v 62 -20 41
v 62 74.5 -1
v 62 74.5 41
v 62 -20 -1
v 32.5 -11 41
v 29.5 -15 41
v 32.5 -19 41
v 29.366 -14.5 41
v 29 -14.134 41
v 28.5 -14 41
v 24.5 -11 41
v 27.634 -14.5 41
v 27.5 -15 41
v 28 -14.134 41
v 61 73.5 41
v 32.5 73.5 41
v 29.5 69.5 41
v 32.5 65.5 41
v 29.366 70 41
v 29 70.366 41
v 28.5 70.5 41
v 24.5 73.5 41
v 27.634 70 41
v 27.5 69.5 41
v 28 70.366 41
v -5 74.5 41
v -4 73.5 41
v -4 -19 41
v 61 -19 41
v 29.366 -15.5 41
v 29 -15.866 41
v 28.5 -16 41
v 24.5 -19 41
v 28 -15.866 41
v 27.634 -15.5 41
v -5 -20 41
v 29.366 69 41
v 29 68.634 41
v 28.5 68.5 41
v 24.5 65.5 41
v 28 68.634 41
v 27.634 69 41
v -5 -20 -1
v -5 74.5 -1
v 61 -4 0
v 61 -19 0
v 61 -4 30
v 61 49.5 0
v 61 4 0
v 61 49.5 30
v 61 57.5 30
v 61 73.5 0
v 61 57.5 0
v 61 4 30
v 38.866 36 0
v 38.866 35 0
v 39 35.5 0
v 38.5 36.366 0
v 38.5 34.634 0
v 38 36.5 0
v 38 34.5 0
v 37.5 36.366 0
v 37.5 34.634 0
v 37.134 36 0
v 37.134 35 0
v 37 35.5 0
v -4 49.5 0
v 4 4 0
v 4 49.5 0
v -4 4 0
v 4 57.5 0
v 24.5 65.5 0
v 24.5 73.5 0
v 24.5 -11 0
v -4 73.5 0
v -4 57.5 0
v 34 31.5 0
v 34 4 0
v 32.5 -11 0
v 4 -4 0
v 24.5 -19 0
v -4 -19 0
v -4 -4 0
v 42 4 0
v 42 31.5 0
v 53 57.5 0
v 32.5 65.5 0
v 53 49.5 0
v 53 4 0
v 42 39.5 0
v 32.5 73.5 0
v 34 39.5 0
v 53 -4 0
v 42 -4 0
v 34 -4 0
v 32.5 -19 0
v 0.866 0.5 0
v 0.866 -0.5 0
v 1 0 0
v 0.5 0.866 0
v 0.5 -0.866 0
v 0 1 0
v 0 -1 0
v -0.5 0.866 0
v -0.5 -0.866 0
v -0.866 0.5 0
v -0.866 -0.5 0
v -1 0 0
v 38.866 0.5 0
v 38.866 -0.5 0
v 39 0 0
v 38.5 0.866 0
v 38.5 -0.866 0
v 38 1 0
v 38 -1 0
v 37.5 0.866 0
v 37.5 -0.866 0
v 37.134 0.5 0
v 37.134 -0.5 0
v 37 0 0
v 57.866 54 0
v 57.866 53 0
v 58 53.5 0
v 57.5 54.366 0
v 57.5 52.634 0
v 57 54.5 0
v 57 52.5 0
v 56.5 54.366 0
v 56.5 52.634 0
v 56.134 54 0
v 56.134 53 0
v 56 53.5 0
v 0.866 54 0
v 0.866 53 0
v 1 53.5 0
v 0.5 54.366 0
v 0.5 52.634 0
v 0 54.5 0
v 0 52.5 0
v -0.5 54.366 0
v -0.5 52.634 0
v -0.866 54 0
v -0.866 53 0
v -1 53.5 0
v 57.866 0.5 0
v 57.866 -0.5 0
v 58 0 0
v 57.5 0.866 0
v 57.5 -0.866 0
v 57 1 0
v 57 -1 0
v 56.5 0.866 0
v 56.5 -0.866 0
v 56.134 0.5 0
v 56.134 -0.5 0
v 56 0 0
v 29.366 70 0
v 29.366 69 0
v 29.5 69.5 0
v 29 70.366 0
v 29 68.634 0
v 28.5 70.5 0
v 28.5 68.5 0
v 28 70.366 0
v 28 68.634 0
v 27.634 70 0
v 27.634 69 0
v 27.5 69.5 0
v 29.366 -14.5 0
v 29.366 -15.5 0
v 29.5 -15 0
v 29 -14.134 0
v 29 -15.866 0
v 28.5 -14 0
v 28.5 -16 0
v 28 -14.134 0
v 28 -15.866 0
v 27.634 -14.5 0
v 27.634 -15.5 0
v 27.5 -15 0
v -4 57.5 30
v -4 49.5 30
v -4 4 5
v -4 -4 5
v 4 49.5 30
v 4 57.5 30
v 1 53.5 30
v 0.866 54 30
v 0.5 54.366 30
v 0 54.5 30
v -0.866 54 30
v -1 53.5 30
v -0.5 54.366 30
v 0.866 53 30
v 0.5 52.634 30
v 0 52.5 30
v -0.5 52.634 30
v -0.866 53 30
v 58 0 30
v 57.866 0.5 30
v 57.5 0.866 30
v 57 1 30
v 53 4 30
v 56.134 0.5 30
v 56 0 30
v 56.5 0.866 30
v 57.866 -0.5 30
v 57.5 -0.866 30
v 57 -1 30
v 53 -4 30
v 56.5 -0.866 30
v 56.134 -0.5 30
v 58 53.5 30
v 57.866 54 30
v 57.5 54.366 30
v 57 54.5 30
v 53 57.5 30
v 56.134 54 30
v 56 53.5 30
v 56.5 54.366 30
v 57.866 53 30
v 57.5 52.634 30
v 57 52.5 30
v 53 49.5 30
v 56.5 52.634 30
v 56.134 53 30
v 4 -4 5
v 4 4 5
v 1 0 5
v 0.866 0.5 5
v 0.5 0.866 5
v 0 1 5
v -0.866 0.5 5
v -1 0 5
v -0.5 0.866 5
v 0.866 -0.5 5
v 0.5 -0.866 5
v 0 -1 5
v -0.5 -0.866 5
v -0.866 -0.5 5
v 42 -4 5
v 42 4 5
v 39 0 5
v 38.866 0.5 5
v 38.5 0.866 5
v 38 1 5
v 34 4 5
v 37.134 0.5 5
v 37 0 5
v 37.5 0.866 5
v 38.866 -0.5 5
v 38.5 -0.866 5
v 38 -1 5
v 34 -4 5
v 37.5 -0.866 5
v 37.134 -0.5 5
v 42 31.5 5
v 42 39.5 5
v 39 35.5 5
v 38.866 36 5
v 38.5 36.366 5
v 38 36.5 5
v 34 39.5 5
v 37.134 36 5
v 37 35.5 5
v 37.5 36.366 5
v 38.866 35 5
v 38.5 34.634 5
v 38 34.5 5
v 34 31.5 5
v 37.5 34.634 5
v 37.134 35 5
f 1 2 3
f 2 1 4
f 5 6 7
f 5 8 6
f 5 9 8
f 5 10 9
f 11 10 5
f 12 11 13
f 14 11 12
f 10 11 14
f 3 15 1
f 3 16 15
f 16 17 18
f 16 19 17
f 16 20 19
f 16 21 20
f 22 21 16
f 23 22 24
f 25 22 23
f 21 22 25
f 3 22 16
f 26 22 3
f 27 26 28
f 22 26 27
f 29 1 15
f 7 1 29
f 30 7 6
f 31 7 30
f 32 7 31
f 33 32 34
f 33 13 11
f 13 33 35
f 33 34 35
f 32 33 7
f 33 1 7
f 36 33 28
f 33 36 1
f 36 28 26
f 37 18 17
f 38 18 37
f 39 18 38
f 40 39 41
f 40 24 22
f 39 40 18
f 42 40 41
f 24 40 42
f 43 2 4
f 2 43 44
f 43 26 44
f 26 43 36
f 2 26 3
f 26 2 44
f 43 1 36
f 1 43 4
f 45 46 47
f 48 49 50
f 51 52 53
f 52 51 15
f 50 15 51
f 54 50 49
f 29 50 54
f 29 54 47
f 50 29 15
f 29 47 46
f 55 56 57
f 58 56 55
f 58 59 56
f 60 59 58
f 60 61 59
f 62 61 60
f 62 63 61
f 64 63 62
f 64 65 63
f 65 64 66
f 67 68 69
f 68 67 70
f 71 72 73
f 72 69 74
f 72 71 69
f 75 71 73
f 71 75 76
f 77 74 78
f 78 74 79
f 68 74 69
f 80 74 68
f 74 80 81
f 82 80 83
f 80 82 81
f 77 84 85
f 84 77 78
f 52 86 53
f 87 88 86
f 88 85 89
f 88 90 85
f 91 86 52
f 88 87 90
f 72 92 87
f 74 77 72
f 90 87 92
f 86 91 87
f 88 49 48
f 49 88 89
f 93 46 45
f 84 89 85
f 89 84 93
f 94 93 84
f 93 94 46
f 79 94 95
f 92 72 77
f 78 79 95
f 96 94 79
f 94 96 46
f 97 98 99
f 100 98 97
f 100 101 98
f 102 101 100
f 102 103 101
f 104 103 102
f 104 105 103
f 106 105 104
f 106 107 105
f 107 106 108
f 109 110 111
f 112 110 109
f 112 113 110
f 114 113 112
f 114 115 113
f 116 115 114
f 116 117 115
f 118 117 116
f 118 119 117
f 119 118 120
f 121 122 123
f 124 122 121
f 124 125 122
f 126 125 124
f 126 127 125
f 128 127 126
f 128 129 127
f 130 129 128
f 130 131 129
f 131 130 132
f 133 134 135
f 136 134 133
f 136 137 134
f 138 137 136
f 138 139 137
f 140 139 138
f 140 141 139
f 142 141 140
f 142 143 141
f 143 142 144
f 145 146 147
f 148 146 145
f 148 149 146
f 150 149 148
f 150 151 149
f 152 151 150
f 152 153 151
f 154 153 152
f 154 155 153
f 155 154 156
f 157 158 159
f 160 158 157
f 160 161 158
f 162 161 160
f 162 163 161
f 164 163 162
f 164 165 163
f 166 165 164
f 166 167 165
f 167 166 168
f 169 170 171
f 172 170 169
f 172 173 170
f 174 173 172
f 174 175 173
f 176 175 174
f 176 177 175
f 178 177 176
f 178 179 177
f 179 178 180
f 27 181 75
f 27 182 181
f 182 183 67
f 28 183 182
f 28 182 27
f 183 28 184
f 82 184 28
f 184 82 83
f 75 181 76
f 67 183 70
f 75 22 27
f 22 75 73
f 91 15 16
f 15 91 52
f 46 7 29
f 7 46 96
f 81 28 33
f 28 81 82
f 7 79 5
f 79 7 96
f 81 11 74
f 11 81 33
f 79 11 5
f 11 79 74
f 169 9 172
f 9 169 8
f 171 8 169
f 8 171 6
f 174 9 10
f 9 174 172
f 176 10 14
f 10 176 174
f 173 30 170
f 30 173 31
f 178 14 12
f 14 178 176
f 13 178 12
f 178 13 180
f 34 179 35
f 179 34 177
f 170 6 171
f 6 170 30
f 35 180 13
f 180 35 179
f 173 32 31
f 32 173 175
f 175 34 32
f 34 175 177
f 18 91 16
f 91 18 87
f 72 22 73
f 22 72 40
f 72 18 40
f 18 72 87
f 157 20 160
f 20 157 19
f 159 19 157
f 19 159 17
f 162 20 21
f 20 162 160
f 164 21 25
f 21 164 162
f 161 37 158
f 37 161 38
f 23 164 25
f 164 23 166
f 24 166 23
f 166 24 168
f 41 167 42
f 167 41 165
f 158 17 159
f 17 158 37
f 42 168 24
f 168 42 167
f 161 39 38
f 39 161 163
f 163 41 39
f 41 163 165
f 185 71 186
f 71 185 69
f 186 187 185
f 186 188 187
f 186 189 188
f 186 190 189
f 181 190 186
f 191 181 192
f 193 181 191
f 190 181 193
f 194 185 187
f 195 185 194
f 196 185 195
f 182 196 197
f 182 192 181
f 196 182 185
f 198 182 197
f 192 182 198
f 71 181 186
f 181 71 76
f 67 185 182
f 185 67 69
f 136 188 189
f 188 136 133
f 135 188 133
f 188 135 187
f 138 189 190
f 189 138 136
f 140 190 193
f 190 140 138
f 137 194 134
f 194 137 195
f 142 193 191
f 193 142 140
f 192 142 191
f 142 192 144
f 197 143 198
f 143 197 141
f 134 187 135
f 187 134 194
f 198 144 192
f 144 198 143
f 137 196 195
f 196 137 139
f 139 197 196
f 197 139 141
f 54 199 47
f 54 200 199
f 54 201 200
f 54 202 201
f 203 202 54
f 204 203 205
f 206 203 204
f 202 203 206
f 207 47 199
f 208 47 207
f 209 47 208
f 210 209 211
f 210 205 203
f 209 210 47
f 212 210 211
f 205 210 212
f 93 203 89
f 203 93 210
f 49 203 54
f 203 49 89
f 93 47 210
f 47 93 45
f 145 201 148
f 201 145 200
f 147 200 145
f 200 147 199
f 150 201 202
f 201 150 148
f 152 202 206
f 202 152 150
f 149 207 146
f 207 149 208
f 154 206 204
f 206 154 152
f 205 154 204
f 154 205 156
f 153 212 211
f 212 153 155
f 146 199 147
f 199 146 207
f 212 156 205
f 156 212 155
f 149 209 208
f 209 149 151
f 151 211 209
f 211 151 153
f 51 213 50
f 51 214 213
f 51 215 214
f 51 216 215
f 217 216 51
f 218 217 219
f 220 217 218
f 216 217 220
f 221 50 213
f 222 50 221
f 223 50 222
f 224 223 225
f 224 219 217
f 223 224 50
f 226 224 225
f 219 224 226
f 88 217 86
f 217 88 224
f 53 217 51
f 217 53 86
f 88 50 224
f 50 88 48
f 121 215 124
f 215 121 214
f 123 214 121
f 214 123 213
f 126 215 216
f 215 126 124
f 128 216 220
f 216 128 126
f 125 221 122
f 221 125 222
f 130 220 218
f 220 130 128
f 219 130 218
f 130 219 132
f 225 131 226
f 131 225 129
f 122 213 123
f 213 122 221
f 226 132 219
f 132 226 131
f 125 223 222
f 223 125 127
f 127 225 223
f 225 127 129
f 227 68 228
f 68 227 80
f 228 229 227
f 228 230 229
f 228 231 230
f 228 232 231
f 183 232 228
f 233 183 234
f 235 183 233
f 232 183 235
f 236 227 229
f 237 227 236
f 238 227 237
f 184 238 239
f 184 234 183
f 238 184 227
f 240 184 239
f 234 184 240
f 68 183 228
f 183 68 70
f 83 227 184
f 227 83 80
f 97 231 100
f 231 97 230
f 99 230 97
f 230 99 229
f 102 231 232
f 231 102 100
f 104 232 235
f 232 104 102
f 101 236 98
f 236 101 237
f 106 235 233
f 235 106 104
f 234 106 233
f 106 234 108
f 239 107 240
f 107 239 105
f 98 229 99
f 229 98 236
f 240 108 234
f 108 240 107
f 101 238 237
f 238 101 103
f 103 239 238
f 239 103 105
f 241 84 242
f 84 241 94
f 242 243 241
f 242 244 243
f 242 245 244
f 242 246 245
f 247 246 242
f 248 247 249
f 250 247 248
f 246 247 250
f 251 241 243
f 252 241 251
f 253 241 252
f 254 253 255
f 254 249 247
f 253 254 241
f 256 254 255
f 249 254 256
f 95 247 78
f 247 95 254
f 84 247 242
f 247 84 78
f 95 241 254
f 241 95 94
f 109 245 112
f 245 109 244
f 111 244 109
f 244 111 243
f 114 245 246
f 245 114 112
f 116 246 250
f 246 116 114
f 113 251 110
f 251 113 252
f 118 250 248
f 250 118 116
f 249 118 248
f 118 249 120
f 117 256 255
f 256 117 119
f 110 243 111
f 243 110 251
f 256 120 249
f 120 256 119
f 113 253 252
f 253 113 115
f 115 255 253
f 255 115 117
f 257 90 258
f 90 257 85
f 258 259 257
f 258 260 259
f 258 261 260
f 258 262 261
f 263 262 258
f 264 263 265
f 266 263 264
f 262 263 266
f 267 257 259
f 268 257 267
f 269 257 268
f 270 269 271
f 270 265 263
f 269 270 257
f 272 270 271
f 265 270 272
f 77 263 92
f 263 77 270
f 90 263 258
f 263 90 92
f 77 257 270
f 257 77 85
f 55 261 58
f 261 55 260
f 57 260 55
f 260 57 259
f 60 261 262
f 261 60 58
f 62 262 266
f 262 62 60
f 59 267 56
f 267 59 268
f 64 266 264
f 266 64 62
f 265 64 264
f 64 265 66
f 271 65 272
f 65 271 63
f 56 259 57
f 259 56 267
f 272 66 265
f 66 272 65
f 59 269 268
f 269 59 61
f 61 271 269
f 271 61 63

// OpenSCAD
$fn=12;

//Box wall thickness
WALL_T=1;

//Standoff dimensions
STAND_R=8.0;
STAND_HOLE_R=1.0;

//ProMicro board dimensions
MICRO_H_DIM=[38, 35.5, 0];
MICRO_H_OFFSET=4;
MICRO_STAND_H=5;

//Trigger board dimensions
TRIG_H_DIM=[57, 53.5, 0];
TRIG_H_OFFSET=2.5;
TRIG_THICK=0;
TRIG_DIM=[TRIG_H_DIM[0], TRIG_H_DIM[1]+TRIG_H_OFFSET*2, TRIG_THICK];
TRIG_STAND_H=30;
TRIG_COMP_H=11;

//BOX Bottom Dimensions
BOX_X_SPACE=0;
BOX_Y_SPACE=30;
BOX_BOTTOM_INSIDE_D = [TRIG_DIM[0]+BOX_X_SPACE+STAND_R, TRIG_DIM[1]+BOX_Y_SPACE+STAND_R/2, TRIG_STAND_H+TRIG_COMP_H+TRIG_THICK];
BOX_BOTTOM_OUTSIDE_D = [BOX_BOTTOM_INSIDE_D[0]+WALL_T*2, BOX_BOTTOM_INSIDE_D[1]+WALL_T*2, BOX_BOTTOM_INSIDE_D[2]+WALL_T];
BOX_TOP_H=5+WALL_T;
BOX_TOP_CLR=0.5;

boxTop();
!boxBottomComplete();

module boxBottomComplete() {
	union() {
		boxBottom();
		trigStands();
		microStands();
	}
}

module boxTop() {
	translate([-STAND_R/2-WALL_T-BOX_TOP_CLR/2, -STAND_R/2-WALL_T-BOX_TOP_CLR/2, -BOX_TOP_H-WALL_T])
	difference() {
		translate([-BOX_X_SPACE/2-WALL_T, -BOX_Y_SPACE/2-WALL_T, -BOX_TOP_H-WALL_T])
			cube([BOX_BOTTOM_OUTSIDE_D[0]+WALL_T*2+BOX_TOP_CLR, BOX_BOTTOM_OUTSIDE_D[1]+WALL_T*2+BOX_TOP_CLR, BOX_TOP_H]);
		translate([-BOX_X_SPACE/2, -BOX_Y_SPACE/2, -BOX_TOP_H])
			cube([BOX_BOTTOM_OUTSIDE_D[0]+BOX_TOP_CLR, BOX_BOTTOM_OUTSIDE_D[1]+BOX_TOP_CLR, BOX_TOP_H]);
    }
}

module boxBottom() {
	translate([-STAND_R/2, -STAND_R/2, 0])
    union() {
		difference() {
			translate([-WALL_T-BOX_X_SPACE/2, -WALL_T-BOX_Y_SPACE/2, -WALL_T])
				cube([BOX_BOTTOM_OUTSIDE_D[0], BOX_BOTTOM_OUTSIDE_D[1], BOX_BOTTOM_OUTSIDE_D[2]]);
			translate([-BOX_X_SPACE/2, -BOX_Y_SPACE/2, 0])
				cube([BOX_BOTTOM_INSIDE_D[0], BOX_BOTTOM_INSIDE_D[1], BOX_BOTTOM_INSIDE_D[2]+WALL_T*2]);
	    }
	
		translate([BOX_BOTTOM_INSIDE_D[0]/2-STAND_R/2, -BOX_Y_SPACE/2, 0])
			boxStand();
	
		translate([BOX_BOTTOM_INSIDE_D[0]/2-STAND_R/2, BOX_BOTTOM_INSIDE_D[1]-BOX_Y_SPACE/2-STAND_R, 0])
			boxStand();
    }
}

module boxStand() {
	difference() {
		cube([STAND_R, STAND_R, BOX_BOTTOM_INSIDE_D[2]]);
		translate([STAND_R/2, STAND_R/2, -0.01])
			cylinder(r=STAND_HOLE_R, h=BOX_BOTTOM_INSIDE_D[2]+WALL_T+0.02);
	}
}

module microStands() {
	translate([-STAND_R/2, -STAND_R/2, 0])
    union() {
		microStand();
//		translate([0, MICRO_H_DIM[1], 0])
//			microStand();
		translate([MICRO_H_DIM[0], 0, 0])
			microStand(cylinder=false);
		translate([MICRO_H_DIM[0], MICRO_H_DIM[1], 0])
			microStand(cylinder=false);
    }
}

module microStand(cylinder=false) {
	difference() {
		if ( cylinder ) {
			translate([STAND_R/2, STAND_R/2, 0])
				cylinder(r=STAND_R, h=MICRO_STAND_H);
		}
		else
			cube([STAND_R, STAND_R, MICRO_STAND_H]);
		translate([STAND_R/2, STAND_R/2, -0.01])
			cylinder(r=STAND_HOLE_R, h=MICRO_STAND_H+0.02);
	}
}

module trigStands() {
	translate([-STAND_R/2, -STAND_R/2, 0])
    union() {
		translate([0, TRIG_H_DIM[1], 0])
			trigStand();
		translate([TRIG_H_DIM[0], 0, 0])
			trigStand();
		translate([TRIG_H_DIM[0], TRIG_H_DIM[1], 0])
			trigStand();
    }
}

module trigStand() {
	difference() {
		cube([STAND_R, STAND_R, TRIG_STAND_H]);
		translate([STAND_R/2, STAND_R/2, -0.01])
			cylinder(r=STAND_HOLE_R, h=TRIG_STAND_H+0.02);
	}
}
